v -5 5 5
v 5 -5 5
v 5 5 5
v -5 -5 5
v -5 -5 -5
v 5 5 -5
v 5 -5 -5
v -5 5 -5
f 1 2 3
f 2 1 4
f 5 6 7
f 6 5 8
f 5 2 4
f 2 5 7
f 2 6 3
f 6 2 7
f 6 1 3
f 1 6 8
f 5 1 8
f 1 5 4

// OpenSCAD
function half(x) = x/2;

module shell(dim)
{
    cube(dim,center=true);
}



//--------------------

screen_pcb_height = 28;
screen_pcb_width = 27.5;


shell([10,10,10]);
